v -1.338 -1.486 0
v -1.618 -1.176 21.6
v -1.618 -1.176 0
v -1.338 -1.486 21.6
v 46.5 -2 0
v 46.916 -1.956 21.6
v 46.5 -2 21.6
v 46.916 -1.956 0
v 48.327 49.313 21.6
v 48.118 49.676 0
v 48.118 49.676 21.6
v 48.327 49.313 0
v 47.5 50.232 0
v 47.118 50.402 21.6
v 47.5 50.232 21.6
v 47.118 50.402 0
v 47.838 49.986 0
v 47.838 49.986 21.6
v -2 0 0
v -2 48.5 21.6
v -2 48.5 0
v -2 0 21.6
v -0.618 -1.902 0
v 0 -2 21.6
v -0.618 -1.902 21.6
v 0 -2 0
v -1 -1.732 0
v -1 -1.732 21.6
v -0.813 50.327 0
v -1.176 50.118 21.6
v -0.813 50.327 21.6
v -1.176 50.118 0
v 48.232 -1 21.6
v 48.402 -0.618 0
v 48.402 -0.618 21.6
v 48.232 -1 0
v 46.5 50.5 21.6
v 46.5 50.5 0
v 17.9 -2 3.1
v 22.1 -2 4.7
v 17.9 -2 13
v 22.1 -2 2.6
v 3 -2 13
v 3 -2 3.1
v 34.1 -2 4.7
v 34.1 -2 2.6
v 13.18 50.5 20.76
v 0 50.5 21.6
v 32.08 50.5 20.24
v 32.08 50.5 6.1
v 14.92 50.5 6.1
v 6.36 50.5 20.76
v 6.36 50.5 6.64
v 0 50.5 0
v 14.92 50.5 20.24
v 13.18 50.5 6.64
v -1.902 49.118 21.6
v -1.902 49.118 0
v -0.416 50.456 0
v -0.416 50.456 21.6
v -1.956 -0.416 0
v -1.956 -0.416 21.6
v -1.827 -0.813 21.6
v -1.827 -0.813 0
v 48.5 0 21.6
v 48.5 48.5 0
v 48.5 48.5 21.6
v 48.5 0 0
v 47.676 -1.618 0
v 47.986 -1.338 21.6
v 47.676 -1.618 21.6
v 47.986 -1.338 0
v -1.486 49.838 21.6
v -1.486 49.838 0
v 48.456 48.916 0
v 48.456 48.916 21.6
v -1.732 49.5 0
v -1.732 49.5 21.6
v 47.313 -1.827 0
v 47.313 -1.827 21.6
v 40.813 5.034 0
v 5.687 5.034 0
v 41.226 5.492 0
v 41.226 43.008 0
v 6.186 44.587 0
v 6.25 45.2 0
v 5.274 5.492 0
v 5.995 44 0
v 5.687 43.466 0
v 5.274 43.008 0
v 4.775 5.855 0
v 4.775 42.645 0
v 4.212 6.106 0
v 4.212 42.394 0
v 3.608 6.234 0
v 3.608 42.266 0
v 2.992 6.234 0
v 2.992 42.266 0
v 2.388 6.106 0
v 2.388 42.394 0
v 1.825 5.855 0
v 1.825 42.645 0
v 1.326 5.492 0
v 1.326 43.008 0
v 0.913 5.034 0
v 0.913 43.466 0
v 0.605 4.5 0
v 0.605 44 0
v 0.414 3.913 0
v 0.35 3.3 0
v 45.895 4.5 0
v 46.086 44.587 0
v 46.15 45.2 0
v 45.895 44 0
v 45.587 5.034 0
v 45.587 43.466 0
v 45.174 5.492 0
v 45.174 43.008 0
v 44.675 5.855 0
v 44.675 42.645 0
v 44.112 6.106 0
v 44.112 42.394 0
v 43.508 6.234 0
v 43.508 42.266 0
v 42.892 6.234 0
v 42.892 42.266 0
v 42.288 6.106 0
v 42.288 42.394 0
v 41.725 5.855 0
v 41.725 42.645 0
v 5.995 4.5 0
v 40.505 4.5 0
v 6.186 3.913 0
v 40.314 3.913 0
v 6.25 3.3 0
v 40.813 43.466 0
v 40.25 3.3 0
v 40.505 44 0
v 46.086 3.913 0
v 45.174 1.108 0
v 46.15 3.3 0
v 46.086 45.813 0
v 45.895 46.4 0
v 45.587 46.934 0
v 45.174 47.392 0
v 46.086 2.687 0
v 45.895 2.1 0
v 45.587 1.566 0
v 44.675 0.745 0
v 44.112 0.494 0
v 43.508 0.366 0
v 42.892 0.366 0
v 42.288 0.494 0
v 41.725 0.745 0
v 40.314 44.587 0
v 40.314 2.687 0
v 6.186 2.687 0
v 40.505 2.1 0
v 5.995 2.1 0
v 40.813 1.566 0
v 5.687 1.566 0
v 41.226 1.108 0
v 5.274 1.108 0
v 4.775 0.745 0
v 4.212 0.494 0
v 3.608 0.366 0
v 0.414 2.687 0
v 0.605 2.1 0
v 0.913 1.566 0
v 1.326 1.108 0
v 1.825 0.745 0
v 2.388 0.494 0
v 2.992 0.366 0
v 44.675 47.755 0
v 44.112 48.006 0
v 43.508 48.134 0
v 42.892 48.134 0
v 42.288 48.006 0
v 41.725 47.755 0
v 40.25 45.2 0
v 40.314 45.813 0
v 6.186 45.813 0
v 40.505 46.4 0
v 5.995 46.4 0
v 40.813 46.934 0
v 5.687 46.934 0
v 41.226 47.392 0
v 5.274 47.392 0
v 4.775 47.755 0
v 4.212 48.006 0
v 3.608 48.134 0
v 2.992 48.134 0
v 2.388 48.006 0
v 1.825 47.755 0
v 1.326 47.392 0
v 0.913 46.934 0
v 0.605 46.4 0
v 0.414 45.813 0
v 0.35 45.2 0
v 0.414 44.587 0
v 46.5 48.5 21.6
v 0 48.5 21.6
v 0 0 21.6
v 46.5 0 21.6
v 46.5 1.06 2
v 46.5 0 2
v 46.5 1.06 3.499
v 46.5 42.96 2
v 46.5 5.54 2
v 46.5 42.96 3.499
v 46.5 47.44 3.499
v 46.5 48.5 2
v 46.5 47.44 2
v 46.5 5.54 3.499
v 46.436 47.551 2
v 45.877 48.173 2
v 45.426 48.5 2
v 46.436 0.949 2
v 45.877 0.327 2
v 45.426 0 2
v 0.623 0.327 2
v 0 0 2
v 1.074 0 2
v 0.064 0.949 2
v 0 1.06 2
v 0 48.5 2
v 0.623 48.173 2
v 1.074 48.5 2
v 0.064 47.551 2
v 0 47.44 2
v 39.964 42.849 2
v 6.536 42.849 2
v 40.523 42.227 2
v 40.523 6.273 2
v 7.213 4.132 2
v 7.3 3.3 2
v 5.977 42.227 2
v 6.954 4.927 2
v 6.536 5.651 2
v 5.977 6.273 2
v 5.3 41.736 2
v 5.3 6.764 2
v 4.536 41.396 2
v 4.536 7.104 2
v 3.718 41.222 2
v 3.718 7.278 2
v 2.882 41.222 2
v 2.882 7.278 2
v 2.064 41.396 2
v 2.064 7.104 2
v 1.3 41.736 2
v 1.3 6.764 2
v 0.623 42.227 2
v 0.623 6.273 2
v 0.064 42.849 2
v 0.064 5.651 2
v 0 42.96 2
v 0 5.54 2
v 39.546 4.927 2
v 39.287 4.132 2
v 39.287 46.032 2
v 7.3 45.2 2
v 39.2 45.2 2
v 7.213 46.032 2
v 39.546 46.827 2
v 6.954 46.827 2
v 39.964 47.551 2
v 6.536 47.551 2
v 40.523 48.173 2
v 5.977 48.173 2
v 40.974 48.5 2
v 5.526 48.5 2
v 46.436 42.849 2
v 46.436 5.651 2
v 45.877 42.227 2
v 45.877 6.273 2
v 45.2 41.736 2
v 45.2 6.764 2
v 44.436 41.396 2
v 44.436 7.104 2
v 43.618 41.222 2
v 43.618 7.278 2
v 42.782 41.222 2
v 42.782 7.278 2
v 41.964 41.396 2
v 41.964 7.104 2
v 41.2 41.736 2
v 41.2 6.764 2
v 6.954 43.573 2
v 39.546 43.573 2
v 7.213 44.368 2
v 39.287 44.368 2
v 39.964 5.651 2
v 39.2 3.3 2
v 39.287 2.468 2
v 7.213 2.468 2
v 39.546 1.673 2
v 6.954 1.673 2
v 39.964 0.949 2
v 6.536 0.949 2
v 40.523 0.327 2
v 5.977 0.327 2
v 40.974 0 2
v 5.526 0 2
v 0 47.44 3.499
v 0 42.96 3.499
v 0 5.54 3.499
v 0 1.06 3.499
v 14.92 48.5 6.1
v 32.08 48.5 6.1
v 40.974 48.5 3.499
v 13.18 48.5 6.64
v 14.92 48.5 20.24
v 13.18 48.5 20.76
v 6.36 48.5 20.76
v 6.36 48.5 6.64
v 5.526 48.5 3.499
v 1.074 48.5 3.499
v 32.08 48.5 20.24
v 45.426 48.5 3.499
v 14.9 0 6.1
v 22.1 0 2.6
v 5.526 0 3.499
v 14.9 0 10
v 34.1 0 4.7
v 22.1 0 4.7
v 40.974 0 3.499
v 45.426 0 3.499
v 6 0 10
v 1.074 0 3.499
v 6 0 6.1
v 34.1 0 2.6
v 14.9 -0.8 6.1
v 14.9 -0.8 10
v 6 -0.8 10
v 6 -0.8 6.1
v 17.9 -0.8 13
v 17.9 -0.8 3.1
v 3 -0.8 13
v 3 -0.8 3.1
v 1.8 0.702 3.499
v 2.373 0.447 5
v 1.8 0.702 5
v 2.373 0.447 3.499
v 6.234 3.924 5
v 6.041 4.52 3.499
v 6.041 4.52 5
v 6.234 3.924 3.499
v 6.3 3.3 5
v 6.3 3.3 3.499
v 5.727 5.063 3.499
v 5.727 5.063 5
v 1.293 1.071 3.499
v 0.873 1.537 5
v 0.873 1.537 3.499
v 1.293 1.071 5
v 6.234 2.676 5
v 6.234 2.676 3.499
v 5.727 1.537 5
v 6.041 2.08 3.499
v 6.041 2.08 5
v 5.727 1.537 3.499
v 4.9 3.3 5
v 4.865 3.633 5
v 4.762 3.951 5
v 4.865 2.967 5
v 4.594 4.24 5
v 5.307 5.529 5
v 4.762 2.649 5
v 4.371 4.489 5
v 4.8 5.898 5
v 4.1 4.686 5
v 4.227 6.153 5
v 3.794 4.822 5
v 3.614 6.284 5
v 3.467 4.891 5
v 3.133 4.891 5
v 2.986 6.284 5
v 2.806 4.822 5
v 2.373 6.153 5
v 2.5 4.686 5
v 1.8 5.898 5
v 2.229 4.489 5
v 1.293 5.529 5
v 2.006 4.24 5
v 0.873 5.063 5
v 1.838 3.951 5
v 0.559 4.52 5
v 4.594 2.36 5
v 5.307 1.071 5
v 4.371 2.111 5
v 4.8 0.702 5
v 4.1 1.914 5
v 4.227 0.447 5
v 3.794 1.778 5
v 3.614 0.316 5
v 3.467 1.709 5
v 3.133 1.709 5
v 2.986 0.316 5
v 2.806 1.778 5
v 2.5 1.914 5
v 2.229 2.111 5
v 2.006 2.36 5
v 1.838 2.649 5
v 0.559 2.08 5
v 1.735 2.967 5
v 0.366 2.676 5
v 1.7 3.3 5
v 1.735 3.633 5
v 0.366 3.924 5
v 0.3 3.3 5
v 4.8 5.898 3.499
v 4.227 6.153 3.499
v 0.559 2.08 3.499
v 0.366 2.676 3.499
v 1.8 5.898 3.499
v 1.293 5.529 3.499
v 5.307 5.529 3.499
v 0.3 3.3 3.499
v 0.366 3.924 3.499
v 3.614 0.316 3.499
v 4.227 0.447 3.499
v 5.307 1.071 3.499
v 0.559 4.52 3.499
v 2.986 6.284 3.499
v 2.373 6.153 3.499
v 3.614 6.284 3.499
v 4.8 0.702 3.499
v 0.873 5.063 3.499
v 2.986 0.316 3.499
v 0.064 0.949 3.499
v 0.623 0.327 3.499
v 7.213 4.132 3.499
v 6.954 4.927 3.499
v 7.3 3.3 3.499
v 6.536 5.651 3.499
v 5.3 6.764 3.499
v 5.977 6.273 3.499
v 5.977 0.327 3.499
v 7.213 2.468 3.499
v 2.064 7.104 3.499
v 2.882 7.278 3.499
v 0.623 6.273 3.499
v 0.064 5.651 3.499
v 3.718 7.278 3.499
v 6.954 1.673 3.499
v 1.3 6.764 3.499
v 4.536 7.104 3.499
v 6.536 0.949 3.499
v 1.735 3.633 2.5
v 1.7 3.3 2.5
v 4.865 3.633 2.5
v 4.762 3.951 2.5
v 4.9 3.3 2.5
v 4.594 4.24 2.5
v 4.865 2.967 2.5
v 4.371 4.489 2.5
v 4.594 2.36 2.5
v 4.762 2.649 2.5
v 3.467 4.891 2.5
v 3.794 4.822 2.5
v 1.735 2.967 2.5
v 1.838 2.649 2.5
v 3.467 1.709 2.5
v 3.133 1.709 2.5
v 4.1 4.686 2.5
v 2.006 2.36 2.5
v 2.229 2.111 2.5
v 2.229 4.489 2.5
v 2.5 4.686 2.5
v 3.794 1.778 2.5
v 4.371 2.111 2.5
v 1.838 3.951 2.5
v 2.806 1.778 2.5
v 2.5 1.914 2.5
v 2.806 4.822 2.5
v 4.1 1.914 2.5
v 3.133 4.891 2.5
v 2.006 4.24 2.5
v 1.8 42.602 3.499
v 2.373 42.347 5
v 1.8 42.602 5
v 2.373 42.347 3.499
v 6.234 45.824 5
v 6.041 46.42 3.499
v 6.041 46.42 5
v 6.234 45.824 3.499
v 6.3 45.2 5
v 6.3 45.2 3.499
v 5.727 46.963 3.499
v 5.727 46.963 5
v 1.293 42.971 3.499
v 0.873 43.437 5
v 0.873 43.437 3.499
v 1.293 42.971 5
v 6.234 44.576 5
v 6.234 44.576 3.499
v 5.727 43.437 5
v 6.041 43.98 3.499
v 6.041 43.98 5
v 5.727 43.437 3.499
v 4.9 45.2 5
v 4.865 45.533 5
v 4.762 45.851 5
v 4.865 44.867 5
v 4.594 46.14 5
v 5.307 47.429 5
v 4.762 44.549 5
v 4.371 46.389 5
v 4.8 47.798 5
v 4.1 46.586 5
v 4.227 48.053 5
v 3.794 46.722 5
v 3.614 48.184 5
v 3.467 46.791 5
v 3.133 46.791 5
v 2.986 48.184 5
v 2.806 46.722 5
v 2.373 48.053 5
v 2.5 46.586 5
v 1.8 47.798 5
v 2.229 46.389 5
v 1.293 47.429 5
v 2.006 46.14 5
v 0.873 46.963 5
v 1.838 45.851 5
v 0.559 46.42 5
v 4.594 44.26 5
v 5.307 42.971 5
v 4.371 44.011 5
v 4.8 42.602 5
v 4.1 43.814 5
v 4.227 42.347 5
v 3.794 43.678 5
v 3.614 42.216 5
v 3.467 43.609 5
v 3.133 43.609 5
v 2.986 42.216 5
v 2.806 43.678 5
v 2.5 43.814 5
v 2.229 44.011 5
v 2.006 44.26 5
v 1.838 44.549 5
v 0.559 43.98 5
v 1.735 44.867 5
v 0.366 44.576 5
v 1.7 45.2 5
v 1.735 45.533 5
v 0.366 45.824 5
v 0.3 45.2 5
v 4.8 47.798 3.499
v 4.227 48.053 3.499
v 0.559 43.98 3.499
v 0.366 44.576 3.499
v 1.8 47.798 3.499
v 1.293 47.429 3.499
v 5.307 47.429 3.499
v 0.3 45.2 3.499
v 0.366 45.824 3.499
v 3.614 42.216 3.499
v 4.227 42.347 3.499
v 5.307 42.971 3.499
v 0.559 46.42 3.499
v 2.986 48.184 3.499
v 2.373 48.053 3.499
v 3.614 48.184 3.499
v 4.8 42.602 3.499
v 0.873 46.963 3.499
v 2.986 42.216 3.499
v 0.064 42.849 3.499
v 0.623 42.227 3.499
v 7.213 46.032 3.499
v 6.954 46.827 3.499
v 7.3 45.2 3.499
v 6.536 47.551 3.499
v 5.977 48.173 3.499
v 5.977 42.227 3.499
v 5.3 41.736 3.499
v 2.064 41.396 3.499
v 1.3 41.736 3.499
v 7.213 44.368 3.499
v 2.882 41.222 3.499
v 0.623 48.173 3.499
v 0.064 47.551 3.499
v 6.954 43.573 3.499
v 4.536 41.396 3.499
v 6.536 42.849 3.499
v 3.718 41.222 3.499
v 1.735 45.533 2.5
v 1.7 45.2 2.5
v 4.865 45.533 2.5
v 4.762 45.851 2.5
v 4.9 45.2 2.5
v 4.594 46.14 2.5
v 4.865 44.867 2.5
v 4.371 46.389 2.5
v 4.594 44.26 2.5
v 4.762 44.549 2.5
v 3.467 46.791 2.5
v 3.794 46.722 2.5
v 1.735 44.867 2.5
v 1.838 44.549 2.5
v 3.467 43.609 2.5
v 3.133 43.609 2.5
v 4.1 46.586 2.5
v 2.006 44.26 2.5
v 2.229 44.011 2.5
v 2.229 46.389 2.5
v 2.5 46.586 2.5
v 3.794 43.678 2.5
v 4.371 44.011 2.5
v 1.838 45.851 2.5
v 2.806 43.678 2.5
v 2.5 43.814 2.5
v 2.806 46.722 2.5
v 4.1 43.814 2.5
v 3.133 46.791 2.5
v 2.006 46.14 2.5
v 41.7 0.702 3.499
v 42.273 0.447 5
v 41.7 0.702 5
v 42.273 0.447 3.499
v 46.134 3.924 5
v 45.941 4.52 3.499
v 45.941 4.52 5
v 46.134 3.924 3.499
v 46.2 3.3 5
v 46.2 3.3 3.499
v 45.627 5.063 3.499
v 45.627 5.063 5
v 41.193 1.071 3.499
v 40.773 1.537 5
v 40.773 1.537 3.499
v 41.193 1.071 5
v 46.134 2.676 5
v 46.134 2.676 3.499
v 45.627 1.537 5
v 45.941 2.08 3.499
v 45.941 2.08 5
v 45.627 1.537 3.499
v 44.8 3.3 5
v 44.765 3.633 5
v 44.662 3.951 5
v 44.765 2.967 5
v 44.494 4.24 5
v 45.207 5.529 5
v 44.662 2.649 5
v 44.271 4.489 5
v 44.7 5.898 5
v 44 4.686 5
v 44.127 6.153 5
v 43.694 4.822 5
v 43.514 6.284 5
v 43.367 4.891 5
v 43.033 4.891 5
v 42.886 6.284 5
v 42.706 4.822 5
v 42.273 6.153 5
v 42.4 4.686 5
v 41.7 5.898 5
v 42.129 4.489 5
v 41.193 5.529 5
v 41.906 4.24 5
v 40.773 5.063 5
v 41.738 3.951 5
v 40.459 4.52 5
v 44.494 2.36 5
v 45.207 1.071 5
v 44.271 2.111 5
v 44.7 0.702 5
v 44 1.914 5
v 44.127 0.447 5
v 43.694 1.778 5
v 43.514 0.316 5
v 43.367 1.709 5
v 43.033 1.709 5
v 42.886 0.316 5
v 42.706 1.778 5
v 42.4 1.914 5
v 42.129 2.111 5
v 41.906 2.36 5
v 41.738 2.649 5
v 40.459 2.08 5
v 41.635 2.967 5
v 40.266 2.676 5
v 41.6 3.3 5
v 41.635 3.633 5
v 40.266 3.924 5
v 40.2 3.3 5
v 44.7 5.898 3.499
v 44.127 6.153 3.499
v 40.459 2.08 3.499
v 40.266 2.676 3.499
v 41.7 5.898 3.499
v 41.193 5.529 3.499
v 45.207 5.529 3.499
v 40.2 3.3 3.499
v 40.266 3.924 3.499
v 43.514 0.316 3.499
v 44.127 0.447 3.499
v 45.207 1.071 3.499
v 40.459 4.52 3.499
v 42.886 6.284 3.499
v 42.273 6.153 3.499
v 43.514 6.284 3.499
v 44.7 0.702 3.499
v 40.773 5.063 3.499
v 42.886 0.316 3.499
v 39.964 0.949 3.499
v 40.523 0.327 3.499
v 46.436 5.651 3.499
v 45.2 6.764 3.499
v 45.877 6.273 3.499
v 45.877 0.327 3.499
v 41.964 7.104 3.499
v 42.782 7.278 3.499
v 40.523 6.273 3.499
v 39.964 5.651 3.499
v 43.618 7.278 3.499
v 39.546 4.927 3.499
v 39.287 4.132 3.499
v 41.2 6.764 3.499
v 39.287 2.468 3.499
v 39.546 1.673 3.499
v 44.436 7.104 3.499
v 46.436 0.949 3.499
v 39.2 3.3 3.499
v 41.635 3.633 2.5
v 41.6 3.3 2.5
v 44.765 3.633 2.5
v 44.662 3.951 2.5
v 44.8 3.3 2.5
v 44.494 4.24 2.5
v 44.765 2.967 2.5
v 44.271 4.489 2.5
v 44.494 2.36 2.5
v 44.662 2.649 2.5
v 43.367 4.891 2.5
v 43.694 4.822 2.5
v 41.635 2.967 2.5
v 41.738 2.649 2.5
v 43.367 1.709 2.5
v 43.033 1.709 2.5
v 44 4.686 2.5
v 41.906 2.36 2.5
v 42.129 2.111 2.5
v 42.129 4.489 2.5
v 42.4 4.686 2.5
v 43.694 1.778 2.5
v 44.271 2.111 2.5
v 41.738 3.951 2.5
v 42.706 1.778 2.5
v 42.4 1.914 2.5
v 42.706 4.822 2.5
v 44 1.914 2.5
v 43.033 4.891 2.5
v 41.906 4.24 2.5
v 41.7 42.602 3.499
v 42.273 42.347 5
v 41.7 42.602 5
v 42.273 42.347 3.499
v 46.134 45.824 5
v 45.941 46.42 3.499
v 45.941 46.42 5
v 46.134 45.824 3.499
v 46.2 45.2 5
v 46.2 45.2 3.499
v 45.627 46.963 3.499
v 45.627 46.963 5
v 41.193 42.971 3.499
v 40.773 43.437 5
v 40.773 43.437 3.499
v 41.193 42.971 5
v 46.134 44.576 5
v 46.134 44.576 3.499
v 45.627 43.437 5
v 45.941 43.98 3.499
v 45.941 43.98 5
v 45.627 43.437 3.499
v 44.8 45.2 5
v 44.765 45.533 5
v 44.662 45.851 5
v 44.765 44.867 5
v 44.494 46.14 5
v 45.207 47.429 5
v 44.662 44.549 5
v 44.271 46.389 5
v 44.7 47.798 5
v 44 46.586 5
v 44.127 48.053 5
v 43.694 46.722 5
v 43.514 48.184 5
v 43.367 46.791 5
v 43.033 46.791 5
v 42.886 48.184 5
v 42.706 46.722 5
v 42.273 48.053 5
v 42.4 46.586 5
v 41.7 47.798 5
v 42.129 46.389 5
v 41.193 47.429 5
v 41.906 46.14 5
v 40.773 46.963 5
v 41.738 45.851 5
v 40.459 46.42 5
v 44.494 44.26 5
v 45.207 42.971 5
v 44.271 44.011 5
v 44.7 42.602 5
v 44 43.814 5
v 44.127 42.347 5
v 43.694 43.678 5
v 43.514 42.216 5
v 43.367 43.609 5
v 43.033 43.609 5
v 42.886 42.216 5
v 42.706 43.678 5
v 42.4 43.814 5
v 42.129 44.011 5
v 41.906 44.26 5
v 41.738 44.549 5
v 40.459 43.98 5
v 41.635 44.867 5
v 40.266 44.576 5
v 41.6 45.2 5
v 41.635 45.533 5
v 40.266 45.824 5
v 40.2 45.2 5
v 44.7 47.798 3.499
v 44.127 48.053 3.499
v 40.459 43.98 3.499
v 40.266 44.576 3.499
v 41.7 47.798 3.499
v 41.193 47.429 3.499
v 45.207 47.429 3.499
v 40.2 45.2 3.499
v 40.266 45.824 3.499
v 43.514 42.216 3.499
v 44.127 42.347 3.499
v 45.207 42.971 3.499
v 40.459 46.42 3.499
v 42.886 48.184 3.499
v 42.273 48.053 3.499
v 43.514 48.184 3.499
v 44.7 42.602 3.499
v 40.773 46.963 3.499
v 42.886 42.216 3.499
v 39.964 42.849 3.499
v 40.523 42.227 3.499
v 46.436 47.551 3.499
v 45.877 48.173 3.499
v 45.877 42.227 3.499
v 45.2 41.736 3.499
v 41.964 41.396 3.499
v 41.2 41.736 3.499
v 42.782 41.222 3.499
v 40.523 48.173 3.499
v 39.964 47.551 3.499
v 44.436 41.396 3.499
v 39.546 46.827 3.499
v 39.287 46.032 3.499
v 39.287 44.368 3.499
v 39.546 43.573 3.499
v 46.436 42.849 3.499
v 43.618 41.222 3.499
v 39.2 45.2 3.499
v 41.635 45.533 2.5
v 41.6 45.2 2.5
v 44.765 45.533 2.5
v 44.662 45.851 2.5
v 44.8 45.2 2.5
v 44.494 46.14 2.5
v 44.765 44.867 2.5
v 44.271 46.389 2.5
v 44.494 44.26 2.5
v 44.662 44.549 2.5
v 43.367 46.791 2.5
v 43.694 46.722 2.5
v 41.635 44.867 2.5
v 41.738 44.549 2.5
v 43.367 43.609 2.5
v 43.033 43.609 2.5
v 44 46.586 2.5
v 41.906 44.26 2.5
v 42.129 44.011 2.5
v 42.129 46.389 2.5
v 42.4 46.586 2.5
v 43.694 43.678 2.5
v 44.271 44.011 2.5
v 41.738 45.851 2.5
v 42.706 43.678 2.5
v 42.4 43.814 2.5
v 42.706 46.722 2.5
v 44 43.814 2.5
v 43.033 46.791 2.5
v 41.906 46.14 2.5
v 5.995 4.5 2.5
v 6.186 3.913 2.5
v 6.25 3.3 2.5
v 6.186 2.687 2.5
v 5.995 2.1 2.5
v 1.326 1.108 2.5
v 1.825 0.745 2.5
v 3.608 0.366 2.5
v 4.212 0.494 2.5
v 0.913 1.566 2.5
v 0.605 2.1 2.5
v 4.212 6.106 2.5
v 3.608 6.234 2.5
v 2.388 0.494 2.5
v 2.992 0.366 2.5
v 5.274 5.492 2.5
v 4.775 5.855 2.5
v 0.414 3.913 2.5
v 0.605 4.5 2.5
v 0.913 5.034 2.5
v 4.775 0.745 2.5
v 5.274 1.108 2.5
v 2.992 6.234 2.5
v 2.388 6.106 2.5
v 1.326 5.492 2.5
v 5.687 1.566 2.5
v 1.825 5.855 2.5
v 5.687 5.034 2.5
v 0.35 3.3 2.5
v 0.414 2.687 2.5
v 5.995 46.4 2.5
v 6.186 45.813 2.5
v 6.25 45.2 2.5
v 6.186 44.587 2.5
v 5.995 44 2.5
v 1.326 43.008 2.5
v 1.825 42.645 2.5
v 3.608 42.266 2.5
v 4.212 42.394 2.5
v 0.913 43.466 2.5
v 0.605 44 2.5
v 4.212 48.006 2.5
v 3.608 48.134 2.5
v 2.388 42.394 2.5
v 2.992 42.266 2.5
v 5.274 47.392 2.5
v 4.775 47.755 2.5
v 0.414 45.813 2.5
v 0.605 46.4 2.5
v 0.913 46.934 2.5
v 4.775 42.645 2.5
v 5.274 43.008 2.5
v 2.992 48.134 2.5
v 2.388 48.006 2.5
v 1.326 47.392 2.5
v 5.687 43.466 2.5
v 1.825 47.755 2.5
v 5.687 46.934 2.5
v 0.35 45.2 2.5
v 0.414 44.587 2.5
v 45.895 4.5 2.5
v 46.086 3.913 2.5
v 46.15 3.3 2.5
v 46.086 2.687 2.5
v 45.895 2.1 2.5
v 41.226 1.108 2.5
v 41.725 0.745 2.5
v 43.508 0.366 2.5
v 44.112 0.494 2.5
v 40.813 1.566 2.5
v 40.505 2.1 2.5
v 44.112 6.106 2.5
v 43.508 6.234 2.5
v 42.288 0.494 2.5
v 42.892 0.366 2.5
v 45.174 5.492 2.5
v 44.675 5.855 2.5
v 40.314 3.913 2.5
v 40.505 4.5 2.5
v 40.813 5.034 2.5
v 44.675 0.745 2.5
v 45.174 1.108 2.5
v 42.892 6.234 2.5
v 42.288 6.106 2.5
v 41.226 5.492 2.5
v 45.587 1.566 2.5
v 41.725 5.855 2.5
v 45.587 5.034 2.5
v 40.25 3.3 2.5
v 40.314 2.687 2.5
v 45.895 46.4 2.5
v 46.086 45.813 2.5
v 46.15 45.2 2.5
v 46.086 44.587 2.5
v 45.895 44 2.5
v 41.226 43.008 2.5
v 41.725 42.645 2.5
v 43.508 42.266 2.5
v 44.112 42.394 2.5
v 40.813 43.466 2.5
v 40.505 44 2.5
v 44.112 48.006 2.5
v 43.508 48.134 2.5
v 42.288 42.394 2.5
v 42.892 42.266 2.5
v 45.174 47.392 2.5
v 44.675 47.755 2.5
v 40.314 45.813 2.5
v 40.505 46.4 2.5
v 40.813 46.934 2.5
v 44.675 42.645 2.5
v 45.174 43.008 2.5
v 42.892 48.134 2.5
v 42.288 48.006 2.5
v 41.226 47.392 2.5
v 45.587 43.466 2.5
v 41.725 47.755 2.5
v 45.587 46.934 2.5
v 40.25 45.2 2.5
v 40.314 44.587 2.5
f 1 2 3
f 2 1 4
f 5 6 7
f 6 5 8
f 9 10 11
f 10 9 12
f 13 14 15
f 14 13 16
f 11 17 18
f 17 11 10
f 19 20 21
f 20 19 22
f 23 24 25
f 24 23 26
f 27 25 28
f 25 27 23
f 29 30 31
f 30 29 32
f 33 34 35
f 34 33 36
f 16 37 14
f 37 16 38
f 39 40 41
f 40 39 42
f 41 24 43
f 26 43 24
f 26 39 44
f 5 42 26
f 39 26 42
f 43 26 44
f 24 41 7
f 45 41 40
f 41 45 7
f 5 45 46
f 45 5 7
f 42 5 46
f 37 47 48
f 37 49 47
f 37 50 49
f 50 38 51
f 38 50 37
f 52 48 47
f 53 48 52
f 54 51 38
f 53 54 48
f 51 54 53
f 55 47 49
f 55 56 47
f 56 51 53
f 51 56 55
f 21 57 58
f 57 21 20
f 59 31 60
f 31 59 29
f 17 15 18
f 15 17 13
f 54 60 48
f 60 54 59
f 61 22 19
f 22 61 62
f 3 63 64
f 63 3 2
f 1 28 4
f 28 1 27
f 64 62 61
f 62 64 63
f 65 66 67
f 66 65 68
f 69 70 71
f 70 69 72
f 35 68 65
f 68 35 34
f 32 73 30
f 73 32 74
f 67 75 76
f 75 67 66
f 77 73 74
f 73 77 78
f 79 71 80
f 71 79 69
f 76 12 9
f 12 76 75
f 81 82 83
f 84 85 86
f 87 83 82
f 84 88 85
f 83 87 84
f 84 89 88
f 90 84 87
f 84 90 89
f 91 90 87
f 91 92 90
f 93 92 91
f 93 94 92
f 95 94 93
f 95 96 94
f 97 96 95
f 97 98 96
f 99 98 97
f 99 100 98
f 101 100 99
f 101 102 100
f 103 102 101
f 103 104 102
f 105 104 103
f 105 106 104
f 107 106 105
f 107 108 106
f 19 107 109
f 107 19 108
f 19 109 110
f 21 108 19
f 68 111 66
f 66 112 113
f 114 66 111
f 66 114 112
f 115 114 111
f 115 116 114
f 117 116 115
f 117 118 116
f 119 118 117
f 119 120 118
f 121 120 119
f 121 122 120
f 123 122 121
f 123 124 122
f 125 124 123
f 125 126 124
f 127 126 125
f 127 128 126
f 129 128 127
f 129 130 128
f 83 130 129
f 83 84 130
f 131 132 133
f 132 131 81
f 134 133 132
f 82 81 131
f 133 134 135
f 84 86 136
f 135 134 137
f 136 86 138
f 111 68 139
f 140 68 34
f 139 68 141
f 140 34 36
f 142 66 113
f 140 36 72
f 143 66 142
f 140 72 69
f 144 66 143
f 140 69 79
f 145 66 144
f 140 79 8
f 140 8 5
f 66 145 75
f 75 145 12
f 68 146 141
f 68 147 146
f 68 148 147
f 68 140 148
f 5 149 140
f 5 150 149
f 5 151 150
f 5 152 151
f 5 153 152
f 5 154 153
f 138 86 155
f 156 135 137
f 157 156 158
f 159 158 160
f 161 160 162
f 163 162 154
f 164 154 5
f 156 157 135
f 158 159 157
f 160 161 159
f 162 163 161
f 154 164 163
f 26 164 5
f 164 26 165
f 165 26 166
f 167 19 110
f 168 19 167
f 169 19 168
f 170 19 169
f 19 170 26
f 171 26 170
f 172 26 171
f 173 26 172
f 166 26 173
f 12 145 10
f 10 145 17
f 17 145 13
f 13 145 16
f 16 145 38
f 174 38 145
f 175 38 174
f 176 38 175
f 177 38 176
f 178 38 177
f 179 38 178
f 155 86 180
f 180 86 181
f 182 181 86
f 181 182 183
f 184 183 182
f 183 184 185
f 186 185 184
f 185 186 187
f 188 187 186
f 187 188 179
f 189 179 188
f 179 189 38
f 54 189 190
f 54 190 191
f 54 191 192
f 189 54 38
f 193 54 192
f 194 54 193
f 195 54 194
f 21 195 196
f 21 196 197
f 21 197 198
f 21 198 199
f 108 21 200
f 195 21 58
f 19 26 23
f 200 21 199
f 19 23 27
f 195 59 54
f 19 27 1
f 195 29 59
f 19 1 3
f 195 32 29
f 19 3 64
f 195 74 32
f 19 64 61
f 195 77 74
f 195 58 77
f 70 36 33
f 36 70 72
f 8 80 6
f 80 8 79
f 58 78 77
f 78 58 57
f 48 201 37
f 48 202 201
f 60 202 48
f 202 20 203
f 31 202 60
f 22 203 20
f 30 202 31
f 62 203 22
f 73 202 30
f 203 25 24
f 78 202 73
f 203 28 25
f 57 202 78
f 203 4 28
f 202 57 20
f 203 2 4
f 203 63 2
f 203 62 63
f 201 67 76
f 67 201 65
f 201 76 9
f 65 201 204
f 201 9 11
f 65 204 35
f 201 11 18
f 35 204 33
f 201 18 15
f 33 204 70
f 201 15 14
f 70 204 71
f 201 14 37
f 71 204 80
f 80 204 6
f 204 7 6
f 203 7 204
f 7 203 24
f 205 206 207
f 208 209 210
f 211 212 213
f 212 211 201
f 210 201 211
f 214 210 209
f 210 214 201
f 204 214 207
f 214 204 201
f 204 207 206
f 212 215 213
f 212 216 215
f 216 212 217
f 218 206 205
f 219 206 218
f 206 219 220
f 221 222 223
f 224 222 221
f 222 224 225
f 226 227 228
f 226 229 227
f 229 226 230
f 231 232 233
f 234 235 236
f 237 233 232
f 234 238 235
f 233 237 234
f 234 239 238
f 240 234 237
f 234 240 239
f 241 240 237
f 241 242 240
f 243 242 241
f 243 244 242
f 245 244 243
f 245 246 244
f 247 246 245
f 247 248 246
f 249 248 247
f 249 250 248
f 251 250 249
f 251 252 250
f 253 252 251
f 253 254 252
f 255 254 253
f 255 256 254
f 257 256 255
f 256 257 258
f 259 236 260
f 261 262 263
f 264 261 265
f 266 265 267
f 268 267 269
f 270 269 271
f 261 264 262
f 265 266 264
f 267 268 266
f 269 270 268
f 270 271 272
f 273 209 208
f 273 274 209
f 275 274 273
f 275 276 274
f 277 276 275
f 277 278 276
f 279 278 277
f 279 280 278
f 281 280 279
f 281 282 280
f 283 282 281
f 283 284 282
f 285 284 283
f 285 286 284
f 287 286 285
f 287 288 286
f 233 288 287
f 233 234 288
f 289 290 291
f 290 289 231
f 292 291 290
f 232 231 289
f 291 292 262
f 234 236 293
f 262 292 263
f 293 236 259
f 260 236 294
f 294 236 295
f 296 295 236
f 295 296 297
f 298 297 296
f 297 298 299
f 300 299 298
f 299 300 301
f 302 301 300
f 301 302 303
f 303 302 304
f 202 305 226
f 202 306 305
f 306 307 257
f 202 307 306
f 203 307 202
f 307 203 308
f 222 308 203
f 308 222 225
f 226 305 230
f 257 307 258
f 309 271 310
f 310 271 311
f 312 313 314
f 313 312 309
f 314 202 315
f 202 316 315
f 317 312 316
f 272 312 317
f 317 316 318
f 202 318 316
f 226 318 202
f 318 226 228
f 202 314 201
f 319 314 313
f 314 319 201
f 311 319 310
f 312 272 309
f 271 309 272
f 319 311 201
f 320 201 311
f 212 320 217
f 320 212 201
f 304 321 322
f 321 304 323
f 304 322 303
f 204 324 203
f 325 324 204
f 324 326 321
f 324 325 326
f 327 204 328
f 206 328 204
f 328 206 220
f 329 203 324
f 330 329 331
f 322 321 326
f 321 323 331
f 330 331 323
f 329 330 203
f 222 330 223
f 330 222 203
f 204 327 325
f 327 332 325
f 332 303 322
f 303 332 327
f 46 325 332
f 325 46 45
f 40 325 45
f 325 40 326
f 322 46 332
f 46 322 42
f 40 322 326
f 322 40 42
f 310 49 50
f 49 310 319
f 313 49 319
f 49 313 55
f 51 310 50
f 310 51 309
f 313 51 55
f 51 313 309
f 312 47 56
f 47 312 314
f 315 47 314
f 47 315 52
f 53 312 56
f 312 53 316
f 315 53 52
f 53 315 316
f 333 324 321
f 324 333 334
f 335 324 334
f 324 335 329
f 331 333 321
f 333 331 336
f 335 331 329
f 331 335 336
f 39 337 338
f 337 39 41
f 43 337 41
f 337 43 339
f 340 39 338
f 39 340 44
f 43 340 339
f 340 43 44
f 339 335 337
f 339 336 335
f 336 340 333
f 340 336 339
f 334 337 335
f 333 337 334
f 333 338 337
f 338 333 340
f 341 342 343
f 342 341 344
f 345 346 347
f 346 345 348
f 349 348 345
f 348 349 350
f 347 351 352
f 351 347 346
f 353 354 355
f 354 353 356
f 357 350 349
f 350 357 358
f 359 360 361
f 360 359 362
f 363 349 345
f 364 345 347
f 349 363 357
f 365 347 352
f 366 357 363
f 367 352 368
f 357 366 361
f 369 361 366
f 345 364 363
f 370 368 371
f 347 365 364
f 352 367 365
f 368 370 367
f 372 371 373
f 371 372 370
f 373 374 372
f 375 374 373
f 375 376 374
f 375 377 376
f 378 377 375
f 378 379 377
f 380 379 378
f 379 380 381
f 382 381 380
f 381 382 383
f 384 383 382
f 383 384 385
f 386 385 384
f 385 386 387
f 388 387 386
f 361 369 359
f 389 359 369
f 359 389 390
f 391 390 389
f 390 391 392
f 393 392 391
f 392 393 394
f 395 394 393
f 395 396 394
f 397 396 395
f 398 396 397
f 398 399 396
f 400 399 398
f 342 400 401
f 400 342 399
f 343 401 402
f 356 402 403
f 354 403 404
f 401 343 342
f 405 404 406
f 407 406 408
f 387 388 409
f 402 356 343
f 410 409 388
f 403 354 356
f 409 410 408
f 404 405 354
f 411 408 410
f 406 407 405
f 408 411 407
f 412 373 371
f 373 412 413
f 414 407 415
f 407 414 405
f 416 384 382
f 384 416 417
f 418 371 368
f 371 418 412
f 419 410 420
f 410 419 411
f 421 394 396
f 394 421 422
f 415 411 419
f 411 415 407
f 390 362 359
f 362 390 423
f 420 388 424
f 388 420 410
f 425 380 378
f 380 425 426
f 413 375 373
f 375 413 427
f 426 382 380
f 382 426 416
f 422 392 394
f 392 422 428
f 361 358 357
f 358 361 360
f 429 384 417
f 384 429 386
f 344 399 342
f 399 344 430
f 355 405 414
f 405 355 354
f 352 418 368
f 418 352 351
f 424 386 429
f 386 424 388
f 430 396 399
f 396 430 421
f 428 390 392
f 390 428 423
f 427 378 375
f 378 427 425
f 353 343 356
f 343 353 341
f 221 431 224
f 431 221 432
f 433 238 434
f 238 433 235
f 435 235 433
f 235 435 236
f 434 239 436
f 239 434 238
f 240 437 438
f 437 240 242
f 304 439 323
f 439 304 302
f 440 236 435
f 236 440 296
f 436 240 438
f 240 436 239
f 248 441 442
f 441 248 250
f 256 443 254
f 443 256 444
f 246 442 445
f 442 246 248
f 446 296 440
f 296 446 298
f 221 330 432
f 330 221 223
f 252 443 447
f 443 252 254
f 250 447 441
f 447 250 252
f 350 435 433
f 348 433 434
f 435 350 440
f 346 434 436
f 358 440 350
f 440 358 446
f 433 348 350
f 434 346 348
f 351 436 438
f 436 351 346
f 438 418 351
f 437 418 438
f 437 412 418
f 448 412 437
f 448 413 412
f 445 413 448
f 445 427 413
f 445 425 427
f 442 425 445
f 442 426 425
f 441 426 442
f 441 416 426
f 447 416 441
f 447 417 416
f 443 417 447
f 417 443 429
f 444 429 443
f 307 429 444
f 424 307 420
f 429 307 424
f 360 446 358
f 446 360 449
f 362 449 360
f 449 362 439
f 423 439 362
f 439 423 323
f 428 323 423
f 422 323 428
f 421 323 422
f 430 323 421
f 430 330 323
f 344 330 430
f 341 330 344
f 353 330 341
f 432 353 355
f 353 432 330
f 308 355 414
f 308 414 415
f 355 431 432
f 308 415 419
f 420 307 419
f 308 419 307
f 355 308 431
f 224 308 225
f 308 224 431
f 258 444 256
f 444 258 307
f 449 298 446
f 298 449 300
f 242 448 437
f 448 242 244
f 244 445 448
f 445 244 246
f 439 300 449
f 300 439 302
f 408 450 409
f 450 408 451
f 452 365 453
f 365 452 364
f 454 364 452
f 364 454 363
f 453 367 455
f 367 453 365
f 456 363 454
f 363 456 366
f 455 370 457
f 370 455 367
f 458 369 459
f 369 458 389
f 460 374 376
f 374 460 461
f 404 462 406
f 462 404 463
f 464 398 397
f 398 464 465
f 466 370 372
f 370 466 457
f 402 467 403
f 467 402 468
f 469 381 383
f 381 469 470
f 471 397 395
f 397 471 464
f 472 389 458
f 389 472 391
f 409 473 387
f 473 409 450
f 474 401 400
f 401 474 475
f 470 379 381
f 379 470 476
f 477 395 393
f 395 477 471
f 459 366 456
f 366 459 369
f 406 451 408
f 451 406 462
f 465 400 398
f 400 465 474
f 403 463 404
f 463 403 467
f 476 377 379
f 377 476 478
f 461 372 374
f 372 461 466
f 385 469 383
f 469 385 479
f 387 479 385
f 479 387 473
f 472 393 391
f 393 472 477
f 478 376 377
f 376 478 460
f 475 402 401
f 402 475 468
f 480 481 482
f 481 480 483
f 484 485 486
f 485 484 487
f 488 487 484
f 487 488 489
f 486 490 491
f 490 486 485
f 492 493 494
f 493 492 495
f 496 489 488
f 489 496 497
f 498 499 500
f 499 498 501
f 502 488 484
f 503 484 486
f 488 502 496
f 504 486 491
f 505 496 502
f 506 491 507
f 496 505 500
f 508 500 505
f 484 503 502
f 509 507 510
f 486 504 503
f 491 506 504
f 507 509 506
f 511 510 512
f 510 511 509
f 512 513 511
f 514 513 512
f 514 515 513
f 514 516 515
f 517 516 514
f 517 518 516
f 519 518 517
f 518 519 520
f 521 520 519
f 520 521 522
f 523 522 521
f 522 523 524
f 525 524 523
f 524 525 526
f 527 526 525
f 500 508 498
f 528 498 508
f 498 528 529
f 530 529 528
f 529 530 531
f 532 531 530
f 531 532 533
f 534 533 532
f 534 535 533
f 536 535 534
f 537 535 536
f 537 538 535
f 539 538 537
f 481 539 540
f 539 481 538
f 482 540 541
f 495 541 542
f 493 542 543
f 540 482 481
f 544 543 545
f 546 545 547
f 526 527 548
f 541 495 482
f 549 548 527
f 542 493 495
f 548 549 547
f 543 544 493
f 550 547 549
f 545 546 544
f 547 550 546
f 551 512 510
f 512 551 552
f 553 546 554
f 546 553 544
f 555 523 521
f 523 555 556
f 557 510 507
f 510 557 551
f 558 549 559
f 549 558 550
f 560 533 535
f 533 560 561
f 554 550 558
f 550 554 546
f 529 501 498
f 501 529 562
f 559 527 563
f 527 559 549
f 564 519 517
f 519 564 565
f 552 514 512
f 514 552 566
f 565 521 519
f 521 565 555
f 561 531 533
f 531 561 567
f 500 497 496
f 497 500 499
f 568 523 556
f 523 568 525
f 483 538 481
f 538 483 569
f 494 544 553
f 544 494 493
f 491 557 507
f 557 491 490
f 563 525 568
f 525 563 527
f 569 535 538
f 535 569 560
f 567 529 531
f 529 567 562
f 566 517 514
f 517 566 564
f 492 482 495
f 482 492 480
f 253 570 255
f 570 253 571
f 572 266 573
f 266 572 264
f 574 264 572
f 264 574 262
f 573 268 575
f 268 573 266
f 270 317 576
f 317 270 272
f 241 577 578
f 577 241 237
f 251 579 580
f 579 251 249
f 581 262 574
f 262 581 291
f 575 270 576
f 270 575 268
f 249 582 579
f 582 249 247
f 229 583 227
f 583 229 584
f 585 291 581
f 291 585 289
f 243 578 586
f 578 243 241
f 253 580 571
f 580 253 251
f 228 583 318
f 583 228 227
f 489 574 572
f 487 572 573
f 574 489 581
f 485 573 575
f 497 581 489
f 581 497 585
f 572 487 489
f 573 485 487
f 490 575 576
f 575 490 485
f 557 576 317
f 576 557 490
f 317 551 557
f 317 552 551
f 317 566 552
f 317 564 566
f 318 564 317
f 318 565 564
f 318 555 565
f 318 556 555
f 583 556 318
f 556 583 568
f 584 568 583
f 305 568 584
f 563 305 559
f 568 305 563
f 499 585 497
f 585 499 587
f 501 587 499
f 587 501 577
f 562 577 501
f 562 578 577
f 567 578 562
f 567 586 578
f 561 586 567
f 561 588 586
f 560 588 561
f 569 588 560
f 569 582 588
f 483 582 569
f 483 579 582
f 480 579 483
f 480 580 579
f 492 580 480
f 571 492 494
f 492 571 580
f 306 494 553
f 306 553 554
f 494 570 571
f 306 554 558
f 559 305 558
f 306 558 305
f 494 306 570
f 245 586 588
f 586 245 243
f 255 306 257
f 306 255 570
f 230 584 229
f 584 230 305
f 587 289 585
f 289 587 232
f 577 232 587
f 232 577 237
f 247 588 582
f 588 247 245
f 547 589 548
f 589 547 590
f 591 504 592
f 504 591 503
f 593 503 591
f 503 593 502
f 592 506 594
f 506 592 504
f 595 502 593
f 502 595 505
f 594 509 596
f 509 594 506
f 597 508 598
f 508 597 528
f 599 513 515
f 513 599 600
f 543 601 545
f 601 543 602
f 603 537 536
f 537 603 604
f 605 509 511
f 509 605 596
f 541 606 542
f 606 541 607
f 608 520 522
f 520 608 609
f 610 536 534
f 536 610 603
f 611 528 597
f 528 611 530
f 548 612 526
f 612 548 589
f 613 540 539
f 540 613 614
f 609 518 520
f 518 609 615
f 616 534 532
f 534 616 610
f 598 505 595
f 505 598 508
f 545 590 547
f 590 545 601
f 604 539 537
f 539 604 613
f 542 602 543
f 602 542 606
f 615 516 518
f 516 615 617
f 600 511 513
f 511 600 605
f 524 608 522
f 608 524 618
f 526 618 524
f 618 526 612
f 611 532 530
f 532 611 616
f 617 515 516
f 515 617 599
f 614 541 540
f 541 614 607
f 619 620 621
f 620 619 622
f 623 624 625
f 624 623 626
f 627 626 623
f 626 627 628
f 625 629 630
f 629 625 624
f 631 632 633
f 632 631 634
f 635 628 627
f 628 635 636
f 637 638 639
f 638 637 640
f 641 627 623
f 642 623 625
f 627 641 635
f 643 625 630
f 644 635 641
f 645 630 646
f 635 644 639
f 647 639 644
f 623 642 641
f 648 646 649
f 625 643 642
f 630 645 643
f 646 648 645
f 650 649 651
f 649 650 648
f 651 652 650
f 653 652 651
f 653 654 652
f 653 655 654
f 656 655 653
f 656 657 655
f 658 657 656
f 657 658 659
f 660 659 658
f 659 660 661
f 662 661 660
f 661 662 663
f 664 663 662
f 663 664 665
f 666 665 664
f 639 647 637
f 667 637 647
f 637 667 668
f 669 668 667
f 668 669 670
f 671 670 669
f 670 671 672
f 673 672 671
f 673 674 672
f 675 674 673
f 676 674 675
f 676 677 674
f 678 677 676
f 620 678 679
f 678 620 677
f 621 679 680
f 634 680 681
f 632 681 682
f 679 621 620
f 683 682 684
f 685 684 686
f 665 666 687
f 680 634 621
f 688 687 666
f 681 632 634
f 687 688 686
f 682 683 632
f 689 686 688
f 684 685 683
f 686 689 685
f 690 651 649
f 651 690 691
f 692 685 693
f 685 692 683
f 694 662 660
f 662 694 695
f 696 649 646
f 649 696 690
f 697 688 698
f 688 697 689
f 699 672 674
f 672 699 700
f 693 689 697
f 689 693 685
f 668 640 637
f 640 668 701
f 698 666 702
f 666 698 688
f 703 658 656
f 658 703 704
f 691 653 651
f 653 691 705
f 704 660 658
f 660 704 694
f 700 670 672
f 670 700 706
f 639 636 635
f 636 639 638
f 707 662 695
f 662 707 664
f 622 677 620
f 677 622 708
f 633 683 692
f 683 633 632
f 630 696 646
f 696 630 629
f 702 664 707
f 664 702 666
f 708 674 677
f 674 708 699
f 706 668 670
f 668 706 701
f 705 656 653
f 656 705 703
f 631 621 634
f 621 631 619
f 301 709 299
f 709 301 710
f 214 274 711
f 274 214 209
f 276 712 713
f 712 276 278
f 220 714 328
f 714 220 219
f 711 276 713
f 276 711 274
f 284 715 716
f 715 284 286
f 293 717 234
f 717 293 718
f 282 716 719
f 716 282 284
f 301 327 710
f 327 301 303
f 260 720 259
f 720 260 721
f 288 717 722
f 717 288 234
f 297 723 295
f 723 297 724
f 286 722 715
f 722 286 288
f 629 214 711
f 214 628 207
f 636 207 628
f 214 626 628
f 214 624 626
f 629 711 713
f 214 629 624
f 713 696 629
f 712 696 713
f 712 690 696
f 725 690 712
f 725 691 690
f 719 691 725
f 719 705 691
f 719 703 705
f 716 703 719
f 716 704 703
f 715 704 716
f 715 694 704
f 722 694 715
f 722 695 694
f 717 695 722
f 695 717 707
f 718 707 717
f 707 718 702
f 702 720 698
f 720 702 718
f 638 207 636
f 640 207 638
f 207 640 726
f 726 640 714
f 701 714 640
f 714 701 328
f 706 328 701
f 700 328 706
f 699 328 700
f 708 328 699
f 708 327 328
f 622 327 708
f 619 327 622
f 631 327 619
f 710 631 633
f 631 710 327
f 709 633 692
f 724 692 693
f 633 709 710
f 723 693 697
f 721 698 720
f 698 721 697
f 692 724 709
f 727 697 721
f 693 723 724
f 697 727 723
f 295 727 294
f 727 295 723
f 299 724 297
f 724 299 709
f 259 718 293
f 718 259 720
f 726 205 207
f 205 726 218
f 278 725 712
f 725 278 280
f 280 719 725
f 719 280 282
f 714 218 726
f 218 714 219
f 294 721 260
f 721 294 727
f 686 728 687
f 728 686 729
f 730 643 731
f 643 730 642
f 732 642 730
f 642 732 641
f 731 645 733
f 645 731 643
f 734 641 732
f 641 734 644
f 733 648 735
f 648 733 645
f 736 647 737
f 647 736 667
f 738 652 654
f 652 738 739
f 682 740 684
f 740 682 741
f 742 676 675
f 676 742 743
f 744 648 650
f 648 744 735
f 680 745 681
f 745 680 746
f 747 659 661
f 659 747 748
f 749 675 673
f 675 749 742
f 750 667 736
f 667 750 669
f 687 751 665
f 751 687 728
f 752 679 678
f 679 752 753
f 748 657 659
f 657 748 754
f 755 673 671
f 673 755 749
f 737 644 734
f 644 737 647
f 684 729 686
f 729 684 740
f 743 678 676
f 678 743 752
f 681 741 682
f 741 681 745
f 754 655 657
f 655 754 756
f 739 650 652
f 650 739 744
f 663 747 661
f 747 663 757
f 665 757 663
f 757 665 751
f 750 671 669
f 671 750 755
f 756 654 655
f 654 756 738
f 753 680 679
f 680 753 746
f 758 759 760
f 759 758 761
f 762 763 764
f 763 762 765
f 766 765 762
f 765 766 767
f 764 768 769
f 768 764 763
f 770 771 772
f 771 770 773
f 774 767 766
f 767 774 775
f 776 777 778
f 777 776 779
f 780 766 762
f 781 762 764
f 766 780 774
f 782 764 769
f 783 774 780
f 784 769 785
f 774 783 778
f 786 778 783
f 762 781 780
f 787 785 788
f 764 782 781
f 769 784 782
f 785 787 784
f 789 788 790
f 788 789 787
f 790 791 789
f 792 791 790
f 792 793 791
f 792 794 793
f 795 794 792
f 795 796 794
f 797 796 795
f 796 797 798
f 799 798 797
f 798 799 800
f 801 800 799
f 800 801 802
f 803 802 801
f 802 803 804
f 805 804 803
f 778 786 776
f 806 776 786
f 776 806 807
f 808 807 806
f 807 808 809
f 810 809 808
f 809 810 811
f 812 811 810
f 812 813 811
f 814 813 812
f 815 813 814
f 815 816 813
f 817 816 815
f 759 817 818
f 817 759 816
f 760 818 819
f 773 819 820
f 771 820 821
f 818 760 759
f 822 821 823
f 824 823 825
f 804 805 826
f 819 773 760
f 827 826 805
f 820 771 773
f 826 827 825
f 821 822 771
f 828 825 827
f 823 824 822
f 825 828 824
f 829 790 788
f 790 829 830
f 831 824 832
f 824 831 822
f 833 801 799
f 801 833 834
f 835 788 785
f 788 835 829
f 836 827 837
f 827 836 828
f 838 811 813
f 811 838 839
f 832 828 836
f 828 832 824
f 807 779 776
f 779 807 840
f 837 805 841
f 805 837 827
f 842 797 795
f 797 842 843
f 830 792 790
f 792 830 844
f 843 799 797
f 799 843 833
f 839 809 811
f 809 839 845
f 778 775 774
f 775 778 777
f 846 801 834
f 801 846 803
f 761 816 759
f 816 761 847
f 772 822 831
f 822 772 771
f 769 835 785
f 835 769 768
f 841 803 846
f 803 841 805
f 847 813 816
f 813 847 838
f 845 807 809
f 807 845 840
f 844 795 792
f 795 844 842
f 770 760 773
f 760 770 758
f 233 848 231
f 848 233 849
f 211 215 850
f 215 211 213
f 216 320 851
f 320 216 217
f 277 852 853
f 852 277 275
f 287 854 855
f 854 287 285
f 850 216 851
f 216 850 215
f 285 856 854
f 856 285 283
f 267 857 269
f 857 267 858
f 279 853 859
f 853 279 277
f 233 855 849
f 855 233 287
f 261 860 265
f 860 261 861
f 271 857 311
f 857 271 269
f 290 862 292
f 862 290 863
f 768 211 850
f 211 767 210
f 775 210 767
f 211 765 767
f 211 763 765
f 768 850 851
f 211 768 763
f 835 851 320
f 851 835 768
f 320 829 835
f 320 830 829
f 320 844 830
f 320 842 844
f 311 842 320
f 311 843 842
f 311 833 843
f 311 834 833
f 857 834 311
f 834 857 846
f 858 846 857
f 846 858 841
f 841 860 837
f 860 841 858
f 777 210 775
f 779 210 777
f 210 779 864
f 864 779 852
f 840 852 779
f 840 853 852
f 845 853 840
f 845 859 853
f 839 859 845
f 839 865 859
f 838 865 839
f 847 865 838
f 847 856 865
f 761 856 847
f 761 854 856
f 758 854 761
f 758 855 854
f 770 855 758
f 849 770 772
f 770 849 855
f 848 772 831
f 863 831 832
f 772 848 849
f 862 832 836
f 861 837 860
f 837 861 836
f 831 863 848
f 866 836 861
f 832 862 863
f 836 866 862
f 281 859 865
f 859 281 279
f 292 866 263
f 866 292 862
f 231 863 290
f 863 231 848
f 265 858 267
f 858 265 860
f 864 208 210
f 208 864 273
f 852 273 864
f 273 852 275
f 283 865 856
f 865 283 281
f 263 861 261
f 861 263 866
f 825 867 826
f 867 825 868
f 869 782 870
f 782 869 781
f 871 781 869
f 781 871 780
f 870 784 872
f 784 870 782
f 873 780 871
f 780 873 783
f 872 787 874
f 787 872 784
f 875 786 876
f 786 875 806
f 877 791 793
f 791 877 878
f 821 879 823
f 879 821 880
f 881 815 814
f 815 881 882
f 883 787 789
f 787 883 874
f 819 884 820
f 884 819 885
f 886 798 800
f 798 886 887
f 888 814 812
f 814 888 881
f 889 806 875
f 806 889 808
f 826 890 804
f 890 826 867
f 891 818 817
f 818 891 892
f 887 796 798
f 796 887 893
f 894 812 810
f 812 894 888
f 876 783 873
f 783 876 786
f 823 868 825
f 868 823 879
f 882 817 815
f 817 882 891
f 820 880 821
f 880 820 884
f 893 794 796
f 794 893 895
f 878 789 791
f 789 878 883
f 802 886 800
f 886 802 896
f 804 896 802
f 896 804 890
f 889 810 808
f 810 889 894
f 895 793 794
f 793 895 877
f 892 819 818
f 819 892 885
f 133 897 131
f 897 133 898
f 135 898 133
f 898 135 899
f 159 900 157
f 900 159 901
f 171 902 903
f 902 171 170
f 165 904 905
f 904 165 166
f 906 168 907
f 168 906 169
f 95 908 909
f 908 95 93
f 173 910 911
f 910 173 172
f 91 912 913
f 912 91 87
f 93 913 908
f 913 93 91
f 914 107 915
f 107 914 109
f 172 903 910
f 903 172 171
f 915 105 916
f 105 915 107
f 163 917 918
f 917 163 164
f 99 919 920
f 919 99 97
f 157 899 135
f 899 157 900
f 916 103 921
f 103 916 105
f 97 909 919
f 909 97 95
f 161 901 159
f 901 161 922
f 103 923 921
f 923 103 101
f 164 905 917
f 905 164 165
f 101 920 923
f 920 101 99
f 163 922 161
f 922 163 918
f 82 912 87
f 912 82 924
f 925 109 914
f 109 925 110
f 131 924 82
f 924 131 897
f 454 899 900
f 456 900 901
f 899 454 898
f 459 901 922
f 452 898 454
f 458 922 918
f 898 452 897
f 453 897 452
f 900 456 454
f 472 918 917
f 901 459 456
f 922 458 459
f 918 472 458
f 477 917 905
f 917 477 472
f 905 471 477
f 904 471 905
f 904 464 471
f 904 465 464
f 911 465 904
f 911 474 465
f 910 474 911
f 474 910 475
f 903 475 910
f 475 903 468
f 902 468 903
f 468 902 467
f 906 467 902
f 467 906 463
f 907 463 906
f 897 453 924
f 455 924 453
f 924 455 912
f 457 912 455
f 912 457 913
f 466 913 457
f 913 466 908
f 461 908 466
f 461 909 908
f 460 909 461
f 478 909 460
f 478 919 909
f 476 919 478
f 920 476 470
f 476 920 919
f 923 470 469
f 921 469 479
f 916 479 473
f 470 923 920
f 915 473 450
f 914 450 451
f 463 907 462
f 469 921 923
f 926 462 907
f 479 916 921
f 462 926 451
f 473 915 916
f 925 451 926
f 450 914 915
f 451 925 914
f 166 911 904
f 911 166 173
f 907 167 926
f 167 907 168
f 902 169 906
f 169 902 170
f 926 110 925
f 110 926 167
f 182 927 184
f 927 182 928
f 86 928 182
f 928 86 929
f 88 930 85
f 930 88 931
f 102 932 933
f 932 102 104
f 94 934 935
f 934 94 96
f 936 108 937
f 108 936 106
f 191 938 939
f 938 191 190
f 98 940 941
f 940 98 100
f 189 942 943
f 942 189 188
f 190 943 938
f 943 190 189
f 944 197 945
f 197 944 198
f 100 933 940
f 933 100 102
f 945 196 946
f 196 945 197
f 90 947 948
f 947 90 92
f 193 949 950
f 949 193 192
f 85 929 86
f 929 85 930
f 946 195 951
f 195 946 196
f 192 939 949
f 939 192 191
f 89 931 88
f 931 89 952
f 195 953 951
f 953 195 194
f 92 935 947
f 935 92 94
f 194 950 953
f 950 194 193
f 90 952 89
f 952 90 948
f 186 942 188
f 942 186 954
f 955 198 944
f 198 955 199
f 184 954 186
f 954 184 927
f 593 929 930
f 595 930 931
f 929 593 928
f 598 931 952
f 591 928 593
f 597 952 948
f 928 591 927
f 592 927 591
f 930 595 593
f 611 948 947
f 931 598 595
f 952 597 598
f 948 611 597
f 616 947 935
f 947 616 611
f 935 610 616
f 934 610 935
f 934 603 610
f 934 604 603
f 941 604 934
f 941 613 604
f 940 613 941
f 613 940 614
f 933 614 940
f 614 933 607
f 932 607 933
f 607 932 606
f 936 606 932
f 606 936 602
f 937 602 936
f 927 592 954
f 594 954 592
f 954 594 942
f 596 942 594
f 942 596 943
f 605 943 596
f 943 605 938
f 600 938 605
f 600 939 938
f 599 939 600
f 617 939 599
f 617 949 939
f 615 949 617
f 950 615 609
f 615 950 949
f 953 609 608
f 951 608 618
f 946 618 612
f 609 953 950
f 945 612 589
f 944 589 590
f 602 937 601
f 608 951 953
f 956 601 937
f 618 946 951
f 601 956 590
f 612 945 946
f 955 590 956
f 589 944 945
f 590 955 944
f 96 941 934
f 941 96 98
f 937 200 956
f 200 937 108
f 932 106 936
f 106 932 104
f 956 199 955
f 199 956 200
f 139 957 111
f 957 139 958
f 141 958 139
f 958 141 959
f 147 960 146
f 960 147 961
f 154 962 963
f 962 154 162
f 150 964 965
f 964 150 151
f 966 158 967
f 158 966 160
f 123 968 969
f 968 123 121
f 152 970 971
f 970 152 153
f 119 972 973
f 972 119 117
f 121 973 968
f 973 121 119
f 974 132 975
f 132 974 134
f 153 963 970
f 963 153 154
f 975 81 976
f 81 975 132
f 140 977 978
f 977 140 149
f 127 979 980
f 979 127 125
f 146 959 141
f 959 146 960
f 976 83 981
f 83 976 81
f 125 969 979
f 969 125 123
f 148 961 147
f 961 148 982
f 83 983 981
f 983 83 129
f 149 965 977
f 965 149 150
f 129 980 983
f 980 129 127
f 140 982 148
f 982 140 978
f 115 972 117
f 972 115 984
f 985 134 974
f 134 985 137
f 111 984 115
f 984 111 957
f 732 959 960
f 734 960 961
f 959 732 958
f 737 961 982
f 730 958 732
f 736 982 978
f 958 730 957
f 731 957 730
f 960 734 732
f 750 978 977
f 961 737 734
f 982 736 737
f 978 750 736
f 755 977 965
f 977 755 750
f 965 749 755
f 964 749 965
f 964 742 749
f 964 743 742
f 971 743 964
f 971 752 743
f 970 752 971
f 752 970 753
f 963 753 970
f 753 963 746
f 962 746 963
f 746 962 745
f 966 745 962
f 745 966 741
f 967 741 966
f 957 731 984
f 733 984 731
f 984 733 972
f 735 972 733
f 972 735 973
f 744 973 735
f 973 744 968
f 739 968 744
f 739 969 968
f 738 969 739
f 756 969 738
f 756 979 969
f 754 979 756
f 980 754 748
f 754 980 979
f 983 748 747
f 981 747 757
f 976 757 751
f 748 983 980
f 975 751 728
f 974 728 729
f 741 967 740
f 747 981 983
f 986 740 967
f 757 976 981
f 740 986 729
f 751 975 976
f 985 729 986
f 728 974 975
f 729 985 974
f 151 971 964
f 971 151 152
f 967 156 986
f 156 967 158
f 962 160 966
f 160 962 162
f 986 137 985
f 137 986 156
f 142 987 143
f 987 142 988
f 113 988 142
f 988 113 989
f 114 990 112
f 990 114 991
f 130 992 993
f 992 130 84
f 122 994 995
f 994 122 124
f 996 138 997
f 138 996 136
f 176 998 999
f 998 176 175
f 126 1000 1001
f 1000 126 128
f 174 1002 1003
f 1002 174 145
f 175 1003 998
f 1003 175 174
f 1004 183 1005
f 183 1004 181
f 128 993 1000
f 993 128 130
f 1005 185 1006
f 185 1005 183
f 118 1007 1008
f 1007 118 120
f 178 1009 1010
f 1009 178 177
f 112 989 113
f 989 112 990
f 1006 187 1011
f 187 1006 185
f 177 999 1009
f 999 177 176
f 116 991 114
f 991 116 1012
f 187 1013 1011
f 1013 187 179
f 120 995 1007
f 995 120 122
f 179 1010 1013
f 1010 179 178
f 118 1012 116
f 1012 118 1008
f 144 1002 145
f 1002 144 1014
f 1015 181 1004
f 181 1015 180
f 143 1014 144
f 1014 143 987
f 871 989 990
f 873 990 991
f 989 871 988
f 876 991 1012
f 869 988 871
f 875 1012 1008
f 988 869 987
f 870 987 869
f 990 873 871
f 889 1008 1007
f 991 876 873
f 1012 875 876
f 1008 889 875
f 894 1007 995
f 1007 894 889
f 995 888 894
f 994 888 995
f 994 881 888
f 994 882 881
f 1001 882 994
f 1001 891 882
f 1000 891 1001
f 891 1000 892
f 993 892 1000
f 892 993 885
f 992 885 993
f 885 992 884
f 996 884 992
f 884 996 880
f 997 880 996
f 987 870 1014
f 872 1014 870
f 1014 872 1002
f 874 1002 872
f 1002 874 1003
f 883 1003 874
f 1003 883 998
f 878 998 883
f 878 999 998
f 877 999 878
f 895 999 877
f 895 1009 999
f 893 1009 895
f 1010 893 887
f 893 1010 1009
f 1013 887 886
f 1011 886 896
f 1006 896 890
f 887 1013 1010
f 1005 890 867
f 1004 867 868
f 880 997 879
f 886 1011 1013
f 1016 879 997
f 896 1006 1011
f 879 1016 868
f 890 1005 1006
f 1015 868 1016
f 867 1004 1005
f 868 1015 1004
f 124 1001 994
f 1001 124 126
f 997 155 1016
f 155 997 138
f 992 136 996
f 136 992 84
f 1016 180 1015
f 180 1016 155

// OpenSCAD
// Orange Pi Zero enclosure: bottom shell
// (c) 2018, Phil Dubach
//
// Creative Commons License
// Orange Pi Zero Case by Phil Dubach is licensed under a Creative Commons Attribution-NonCommercial-ShareAlike 4.0 International License.
// Based on a work at https://github.com/phildubach/OrangePiZeroCase.

pcb_w = 46.1;
pcb_l = 48.1;
pcb_h = 1.6;

pcb_below = 3;
pcb_above = 15;

wall = 2;
gap = 0.2;

$fs = 0.2;
eps = 0.001;

inner_w = pcb_w + 2*gap;
inner_l = pcb_l + 2*gap;

outer_w = inner_w + 2*wall;
outer_l = inner_l + 2*wall;

inner_h = pcb_below + pcb_h + pcb_above;


hole_d = 3.2;
hole_inset = 1.5 + hole_d/2; // actually 1.4 to 1.6

post_d = 6;

sd_gap = 0.5;
sd_w = 11 + 2*sd_gap;
sd_h = 1.1 + 2*sd_gap;
sd_x = gap + 22.4 - sd_gap;
sd_below = 1.9+sd_gap;

eth_gap = 0.5;
eth_w = 16.16 + 2*eth_gap;
eth_h = 13.14 + 2*eth_gap;
eth_x = gap + 15.22 - eth_gap;
eth_above = 0 - eth_gap;

usba_gap = 0.5;
usba_w = 5.82 + 2*usba_gap;
usba_h = 13.12 + 2*usba_gap;
usba_x = gap + 6.66 - usba_gap;
usba_above = 2.14 - pcb_h - usba_gap;

usbm_gap = 0.5;
usbm_w = 7.9 + 2*usbm_gap;
usbm_h = 2.9 + 2*usbm_gap;
usbm_x = gap + 6.3 - usbm_gap;
usbm_above = 0 - usbm_gap;

usbc_gap = 3;
usbc_w = usbm_w + 2*usbc_gap;
usbc_h = usbm_h + 2*usbc_gap;
usbc_x = usbm_x - usbc_gap;
usbc_above = usbm_above - usbc_gap;
usbc_t = 0.8;

screwhead_gap = 0.2;
screwhead_d = 5.5 + 2*screwhead_gap;
screwhead_h = 2.5;

corners=[
    [gap+hole_inset, gap+hole_inset],
    [gap+hole_inset, inner_l-gap-hole_inset],
    [inner_w-gap-hole_inset, gap+hole_inset],
    [inner_w-gap-hole_inset, inner_l-gap-hole_inset]
];

module standoff(di, do, h) {
    difference() {
        union() {
            cylinder(h=h, d=do);
            cylinder(h=h/2, d=do+wall);
        }
        translate([0,0,-eps]) cylinder(h=h+2*eps, d=di);
    }
}

difference() {
    union() {
        difference() {
            // rounded outer shell
            linear_extrude(height=inner_h + wall) offset(r=wall) square([inner_w, inner_l]);
            // carve out inner space
            translate([0,0,wall]) cube([inner_w, inner_l, inner_h+eps]);
            // sd
            translate([sd_x,-wall-eps,wall+pcb_below-sd_below]) cube([sd_w,wall+2*eps,sd_h]);
            // eth
            translate([eth_x,inner_l-eps,wall+pcb_below+pcb_h+eth_above]) cube([eth_w,wall+2*eps,eth_h]);
            // USB-A
            translate([usba_x,inner_l-eps,wall+pcb_below+pcb_h+usba_above]) cube([usba_w,wall+2*eps,usba_h]);
            // USB micro
            translate([usbm_x,-wall-eps,wall+pcb_below+pcb_h+usbm_above]) cube([usbm_w,wall+2*eps,usbm_h]);
            // USB micro clearance
            translate([usbc_x,-wall-eps,wall+pcb_below+pcb_h+usbc_above]) cube([usbc_w,wall-usbc_t+eps,usbc_h]);
        }
        // standoff for PCB
        for (pos = corners) {
            translate([pos[0], pos[1], wall-eps]) standoff(di=hole_d, do=post_d, h=pcb_below+eps);
        }
    }
    // screw holes and screw head sink
    for (pos = corners) {
        translate([pos[0], pos[1], -eps]) {
            cylinder(h=wall+2*eps, d=hole_d);
            cylinder(h=screwhead_h+eps, d=screwhead_d);
        }
    }
}
